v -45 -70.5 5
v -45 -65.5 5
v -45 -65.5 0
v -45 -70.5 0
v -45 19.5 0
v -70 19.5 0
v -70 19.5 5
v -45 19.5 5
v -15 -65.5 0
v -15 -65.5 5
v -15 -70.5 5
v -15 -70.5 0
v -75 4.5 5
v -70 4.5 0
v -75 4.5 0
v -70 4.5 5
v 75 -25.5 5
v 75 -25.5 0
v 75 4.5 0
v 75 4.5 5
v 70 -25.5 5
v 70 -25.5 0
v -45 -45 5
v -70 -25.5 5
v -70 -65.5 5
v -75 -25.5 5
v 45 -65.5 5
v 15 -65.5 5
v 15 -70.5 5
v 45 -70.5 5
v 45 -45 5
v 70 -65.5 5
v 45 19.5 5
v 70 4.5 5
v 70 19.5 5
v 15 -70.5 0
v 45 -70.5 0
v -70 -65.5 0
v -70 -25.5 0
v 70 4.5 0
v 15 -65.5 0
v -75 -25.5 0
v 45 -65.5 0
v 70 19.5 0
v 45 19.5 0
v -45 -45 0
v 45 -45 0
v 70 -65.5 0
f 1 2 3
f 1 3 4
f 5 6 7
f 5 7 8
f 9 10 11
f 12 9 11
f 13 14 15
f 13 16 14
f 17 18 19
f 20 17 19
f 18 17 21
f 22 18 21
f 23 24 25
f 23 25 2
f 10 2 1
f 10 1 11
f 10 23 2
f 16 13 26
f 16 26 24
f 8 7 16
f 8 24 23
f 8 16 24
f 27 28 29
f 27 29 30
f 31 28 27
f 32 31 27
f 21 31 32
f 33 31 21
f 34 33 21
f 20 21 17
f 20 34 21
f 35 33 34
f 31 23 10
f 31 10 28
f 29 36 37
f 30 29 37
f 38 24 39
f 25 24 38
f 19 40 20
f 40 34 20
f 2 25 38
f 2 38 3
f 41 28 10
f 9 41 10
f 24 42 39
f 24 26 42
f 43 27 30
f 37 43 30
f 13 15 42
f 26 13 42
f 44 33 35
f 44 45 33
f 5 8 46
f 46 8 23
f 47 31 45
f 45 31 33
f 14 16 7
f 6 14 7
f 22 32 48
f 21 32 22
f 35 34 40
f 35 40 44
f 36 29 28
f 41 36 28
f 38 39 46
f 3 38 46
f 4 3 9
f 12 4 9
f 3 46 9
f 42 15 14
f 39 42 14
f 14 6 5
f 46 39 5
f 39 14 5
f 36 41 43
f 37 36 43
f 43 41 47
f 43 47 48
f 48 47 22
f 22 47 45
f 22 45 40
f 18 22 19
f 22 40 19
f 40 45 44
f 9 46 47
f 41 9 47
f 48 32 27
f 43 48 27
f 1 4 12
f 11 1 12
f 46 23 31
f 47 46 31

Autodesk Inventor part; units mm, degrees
ref_plane "YZ Plane" through (0, 0, 0) normal (1, 0, 0) x (0, 1, 0)
ref_plane "XZ Plane" through (0, 0, 0) normal (0, 1, 0) x (-1, 0, 0)
ref_plane "XY Plane" through (0, 0, 0) normal (0, 0, 1) x (1, 0, 0)
sketch "Sketch1" plane through (0, 0, 0) normal (0, 0, 1) x (1, 0, 0)
  line L0 (0, 2.8582) -> (0, -2.8582) construction
  line L1 (-5.7775, 0) -> (5.7775, 0) construction
  line L2 (-75, -70.5) -> (75, -70.5)
  line L3 (75, -70.5) -> (75, 70.5)
  line L4 (75, 70.5) -> (-75, 70.5)
  line L5 (-75, 70.5) -> (-75, -70.5)
  line L6 (-75, -70.5) -> (75, 70.5) construction
  line L7 (75, -70.5) -> (-75, 70.5) construction
  point P0 (0, 0)
  point P1 (0, 0)
  dimension "d0" = 150
  dimension "d1" = 141
extrude "Extrusion1" add sketch "Sketch1" along normal blind 5
sketch "Sketch2" plane through (0, 0, 5) normal (0, 0, 1) x (1, 0, 0)
  line L0 (-75, -70.5) -> (75, -70.5) projected
  line L1 (0, -70.5) -> (-15, -70.5)
  line L2 (-15, -70.5) -> (15, -70.5)
  line L3 (15, -70.5) -> (45, -70.5)
  line L4 (-15, -70.5) -> (-45, -70.5)
  line L5 (-15, -70.5) -> (15, -70.5)
  line L6 (15, -70.5) -> (15, -65.5)
  line L7 (15, -65.5) -> (-15, -65.5)
  line L8 (-15, -65.5) -> (-15, -70.5)
  line L9 (75, -70.5) -> (75, 70.5) projected
  line L10 (45, -70.5) -> (75, -70.5)
  line L11 (75, -70.5) -> (75, -65.5)
  line L12 (75, -65.5) -> (45, -65.5)
  line L13 (45, -65.5) -> (45, -70.5)
  line L14 (-75, 70.5) -> (-75, -70.5) projected
  line L15 (-45, -70.5) -> (-75, -70.5)
  line L16 (-75, -70.5) -> (-75, -65.5)
  line L17 (-75, -65.5) -> (-45, -65.5)
  line L18 (-45, -65.5) -> (-45, -70.5)
  line L19 (75, -70.5) -> (75, -55.5)
  line L20 (75, -55.5) -> (75, -25.5)
  line L21 (75, -25.5) -> (75, 4.5)
  line L22 (75, 4.5) -> (75, 34.5)
  line L23 (75, 34.5) -> (75, 64.5)
  line L24 (75, -25.5) -> (70, -25.5)
  line L25 (70, -25.5) -> (70, 4.5)
  line L26 (70, 4.5) -> (75, 4.5)
  line L27 (75, 4.5) -> (75, -25.5)
  line L28 (75, 70.5) -> (-75, 70.5) projected
  line L29 (75, 34.5) -> (70, 34.5)
  line L30 (70, 34.5) -> (70, 70.5)
  line L31 (70, 70.5) -> (75, 70.5)
  line L32 (75, 70.5) -> (75, 34.5)
  line L33 (-75, -25.5) -> (-70, -25.5)
  line L34 (-70, -25.5) -> (-70, 4.5)
  line L35 (-70, 4.5) -> (-75, 4.5)
  line L36 (-75, 4.5) -> (-75, -25.5)
  line L37 (-75, 34.5) -> (-70, 34.5)
  line L38 (-70, 34.5) -> (-70, 70.5)
  line L39 (-70, 70.5) -> (-75, 70.5)
  line L40 (-75, 70.5) -> (-75, 34.5)
  line L41 (0, 70.5) -> (-15, 70.5)
  line L42 (-15, 70.5) -> (15, 70.5)
  line L43 (15, 70.5) -> (45, 70.5)
  line L44 (-15, 70.5) -> (-45, 70.5)
  line L45 (-75, 70.5) -> (-45, 70.5)
  line L46 (-45, 70.5) -> (-45, 65.5)
  line L47 (-45, 65.5) -> (-75, 65.5)
  line L48 (-75, 65.5) -> (-75, 70.5)
  line L49 (-15, 70.5) -> (15, 70.5)
  line L50 (15, 70.5) -> (15, 65.5)
  line L51 (15, 65.5) -> (-15, 65.5)
  line L52 (-15, 65.5) -> (-15, 70.5)
  line L53 (45, 70.5) -> (75, 70.5)
  line L54 (75, 70.5) -> (75, 65.5)
  line L55 (75, 65.5) -> (45, 65.5)
  line L56 (45, 65.5) -> (45, 70.5)
  line L57 (-75, -25.5) -> (-70, -25.5)
  line L58 (-70, -25.5) -> (-70, -70.5)
  line L59 (-70, -70.5) -> (-75, -70.5)
  line L60 (-75, -70.5) -> (-75, -25.5)
  line L61 (-75, 4.5) -> (-70, 4.5)
  line L62 (-70, 4.5) -> (-70, 34.5)
  line L63 (-70, 34.5) -> (-75, 34.5)
  line L64 (-75, 34.5) -> (-75, 4.5)
  line L65 (70, 34.5) -> (75, 34.5)
  line L66 (75, 34.5) -> (75, 4.5)
  line L67 (75, 4.5) -> (70, 4.5)
  line L68 (70, 4.5) -> (70, 34.5)
  line L69 (70, -25.5) -> (75, -25.5)
  line L70 (75, -25.5) -> (75, -70.5)
  line L71 (75, -70.5) -> (70, -70.5)
  line L72 (70, -70.5) -> (70, -25.5)
  point P0 (0, 0)
  point P1 (75, 4.5)
  point P2 (-70, 70.5)
  point P3 (-75, 4.5)
  point P4 (70, 65.5)
  point P5 (-70, 65.5)
  point P6 (-70, -65.5)
  point P7 (70, -65.5)
  dimension "d4" = 15
  dimension "d5" = 30
  dimension "d6" = 30
  dimension "d7" = 30
  dimension "d8" = 30
  dimension "d9" = 5
  dimension "d10" = 15
  dimension "d11" = 30
  dimension "d14" = 30
  dimension "d15" = 5
  dimension "d16" = 5
  dimension "d17" = 5
  dimension "d24" = 15
  dimension "d25" = 30
  dimension "d26" = 30
  dimension "d27" = 30
  dimension "d28" = 5
  dimension "d32" = 5
  dimension "d33" = 30
  dimension "d34" = 30
extrude "Extrusion2" cut sketch "Sketch2" against normal blind 8 contours L14 L17 L58 L0 | L58 L17 L18 L0 | L14 L33 L58 L17 | L8 L7 L6 L0 | L14 L37 L62 L35 | L14 L28 L38 L47 | L13 L12 L72 L0 | L38 L28 L46 L47 | L72 L12 L9 L0 | L72 L24 L9 L12 | L28 L50 L51 L52 | L68 L29 L9 L26 | L55 L56 L28 L30 | L30 L28 L9 L55
sketch "Sketch3" plane through (0, 0, 5) normal (0, 0, 1) x (1, 0, 0)
  line L0 (-45, -45) -> (45, -45)
  line L1 (45, -45) -> (45, 45)
  line L2 (45, 45) -> (-45, 45)
  line L3 (-45, 45) -> (-45, -45)
  line L4 (-45, -45) -> (45, 45) construction
  line L5 (45, -45) -> (-45, 45) construction
  point P0 (0, 0)
  dimension "d20" = 90
  dimension "d21" = 90
extrude "Extrusion3" cut sketch "Sketch3" against normal blind 8
sketch "Sketch4" plane through (0, 0, 5) normal (0, 0, 1) x (1, 0, 0)
  line L0 (75, 34.5) -> (75, 65.5) projected
  line L1 (75, 65.5) -> (75, 21.5)
  line L2 (75, 21.5) -> (-125.9097, 21.5)
  line L3 (-125.9097, 21.5) -> (-125.9097, 76.2896)
  line L4 (-125.9097, 76.2896) -> (75, 76.2896)
  line L5 (75, 76.2896) -> (75, 21.5)
  point P0 (0, 0)
  dimension "d29" = 44
extrude "Extrusion4" cut sketch "Sketch4" against normal blind 15
sketch "Sketch5" plane through (45, 21.5, 5) normal (0, 1, 0) x (1, 0, 0)
  line L0 (36.0509, -17.7295) -> (-126.227, -17.7295)
  line L1 (-126.227, -17.7295) -> (-126.227, 31.9582)
  line L2 (-126.227, 31.9582) -> (36.0509, 31.9582)
  line L3 (36.0509, 31.9582) -> (36.0509, -17.7295)
  point P0 (-45, 5)
extrude "Extrusion5" cut sketch "Sketch5" against normal blind 2
properties part number "Plaat achter" material "S235"
